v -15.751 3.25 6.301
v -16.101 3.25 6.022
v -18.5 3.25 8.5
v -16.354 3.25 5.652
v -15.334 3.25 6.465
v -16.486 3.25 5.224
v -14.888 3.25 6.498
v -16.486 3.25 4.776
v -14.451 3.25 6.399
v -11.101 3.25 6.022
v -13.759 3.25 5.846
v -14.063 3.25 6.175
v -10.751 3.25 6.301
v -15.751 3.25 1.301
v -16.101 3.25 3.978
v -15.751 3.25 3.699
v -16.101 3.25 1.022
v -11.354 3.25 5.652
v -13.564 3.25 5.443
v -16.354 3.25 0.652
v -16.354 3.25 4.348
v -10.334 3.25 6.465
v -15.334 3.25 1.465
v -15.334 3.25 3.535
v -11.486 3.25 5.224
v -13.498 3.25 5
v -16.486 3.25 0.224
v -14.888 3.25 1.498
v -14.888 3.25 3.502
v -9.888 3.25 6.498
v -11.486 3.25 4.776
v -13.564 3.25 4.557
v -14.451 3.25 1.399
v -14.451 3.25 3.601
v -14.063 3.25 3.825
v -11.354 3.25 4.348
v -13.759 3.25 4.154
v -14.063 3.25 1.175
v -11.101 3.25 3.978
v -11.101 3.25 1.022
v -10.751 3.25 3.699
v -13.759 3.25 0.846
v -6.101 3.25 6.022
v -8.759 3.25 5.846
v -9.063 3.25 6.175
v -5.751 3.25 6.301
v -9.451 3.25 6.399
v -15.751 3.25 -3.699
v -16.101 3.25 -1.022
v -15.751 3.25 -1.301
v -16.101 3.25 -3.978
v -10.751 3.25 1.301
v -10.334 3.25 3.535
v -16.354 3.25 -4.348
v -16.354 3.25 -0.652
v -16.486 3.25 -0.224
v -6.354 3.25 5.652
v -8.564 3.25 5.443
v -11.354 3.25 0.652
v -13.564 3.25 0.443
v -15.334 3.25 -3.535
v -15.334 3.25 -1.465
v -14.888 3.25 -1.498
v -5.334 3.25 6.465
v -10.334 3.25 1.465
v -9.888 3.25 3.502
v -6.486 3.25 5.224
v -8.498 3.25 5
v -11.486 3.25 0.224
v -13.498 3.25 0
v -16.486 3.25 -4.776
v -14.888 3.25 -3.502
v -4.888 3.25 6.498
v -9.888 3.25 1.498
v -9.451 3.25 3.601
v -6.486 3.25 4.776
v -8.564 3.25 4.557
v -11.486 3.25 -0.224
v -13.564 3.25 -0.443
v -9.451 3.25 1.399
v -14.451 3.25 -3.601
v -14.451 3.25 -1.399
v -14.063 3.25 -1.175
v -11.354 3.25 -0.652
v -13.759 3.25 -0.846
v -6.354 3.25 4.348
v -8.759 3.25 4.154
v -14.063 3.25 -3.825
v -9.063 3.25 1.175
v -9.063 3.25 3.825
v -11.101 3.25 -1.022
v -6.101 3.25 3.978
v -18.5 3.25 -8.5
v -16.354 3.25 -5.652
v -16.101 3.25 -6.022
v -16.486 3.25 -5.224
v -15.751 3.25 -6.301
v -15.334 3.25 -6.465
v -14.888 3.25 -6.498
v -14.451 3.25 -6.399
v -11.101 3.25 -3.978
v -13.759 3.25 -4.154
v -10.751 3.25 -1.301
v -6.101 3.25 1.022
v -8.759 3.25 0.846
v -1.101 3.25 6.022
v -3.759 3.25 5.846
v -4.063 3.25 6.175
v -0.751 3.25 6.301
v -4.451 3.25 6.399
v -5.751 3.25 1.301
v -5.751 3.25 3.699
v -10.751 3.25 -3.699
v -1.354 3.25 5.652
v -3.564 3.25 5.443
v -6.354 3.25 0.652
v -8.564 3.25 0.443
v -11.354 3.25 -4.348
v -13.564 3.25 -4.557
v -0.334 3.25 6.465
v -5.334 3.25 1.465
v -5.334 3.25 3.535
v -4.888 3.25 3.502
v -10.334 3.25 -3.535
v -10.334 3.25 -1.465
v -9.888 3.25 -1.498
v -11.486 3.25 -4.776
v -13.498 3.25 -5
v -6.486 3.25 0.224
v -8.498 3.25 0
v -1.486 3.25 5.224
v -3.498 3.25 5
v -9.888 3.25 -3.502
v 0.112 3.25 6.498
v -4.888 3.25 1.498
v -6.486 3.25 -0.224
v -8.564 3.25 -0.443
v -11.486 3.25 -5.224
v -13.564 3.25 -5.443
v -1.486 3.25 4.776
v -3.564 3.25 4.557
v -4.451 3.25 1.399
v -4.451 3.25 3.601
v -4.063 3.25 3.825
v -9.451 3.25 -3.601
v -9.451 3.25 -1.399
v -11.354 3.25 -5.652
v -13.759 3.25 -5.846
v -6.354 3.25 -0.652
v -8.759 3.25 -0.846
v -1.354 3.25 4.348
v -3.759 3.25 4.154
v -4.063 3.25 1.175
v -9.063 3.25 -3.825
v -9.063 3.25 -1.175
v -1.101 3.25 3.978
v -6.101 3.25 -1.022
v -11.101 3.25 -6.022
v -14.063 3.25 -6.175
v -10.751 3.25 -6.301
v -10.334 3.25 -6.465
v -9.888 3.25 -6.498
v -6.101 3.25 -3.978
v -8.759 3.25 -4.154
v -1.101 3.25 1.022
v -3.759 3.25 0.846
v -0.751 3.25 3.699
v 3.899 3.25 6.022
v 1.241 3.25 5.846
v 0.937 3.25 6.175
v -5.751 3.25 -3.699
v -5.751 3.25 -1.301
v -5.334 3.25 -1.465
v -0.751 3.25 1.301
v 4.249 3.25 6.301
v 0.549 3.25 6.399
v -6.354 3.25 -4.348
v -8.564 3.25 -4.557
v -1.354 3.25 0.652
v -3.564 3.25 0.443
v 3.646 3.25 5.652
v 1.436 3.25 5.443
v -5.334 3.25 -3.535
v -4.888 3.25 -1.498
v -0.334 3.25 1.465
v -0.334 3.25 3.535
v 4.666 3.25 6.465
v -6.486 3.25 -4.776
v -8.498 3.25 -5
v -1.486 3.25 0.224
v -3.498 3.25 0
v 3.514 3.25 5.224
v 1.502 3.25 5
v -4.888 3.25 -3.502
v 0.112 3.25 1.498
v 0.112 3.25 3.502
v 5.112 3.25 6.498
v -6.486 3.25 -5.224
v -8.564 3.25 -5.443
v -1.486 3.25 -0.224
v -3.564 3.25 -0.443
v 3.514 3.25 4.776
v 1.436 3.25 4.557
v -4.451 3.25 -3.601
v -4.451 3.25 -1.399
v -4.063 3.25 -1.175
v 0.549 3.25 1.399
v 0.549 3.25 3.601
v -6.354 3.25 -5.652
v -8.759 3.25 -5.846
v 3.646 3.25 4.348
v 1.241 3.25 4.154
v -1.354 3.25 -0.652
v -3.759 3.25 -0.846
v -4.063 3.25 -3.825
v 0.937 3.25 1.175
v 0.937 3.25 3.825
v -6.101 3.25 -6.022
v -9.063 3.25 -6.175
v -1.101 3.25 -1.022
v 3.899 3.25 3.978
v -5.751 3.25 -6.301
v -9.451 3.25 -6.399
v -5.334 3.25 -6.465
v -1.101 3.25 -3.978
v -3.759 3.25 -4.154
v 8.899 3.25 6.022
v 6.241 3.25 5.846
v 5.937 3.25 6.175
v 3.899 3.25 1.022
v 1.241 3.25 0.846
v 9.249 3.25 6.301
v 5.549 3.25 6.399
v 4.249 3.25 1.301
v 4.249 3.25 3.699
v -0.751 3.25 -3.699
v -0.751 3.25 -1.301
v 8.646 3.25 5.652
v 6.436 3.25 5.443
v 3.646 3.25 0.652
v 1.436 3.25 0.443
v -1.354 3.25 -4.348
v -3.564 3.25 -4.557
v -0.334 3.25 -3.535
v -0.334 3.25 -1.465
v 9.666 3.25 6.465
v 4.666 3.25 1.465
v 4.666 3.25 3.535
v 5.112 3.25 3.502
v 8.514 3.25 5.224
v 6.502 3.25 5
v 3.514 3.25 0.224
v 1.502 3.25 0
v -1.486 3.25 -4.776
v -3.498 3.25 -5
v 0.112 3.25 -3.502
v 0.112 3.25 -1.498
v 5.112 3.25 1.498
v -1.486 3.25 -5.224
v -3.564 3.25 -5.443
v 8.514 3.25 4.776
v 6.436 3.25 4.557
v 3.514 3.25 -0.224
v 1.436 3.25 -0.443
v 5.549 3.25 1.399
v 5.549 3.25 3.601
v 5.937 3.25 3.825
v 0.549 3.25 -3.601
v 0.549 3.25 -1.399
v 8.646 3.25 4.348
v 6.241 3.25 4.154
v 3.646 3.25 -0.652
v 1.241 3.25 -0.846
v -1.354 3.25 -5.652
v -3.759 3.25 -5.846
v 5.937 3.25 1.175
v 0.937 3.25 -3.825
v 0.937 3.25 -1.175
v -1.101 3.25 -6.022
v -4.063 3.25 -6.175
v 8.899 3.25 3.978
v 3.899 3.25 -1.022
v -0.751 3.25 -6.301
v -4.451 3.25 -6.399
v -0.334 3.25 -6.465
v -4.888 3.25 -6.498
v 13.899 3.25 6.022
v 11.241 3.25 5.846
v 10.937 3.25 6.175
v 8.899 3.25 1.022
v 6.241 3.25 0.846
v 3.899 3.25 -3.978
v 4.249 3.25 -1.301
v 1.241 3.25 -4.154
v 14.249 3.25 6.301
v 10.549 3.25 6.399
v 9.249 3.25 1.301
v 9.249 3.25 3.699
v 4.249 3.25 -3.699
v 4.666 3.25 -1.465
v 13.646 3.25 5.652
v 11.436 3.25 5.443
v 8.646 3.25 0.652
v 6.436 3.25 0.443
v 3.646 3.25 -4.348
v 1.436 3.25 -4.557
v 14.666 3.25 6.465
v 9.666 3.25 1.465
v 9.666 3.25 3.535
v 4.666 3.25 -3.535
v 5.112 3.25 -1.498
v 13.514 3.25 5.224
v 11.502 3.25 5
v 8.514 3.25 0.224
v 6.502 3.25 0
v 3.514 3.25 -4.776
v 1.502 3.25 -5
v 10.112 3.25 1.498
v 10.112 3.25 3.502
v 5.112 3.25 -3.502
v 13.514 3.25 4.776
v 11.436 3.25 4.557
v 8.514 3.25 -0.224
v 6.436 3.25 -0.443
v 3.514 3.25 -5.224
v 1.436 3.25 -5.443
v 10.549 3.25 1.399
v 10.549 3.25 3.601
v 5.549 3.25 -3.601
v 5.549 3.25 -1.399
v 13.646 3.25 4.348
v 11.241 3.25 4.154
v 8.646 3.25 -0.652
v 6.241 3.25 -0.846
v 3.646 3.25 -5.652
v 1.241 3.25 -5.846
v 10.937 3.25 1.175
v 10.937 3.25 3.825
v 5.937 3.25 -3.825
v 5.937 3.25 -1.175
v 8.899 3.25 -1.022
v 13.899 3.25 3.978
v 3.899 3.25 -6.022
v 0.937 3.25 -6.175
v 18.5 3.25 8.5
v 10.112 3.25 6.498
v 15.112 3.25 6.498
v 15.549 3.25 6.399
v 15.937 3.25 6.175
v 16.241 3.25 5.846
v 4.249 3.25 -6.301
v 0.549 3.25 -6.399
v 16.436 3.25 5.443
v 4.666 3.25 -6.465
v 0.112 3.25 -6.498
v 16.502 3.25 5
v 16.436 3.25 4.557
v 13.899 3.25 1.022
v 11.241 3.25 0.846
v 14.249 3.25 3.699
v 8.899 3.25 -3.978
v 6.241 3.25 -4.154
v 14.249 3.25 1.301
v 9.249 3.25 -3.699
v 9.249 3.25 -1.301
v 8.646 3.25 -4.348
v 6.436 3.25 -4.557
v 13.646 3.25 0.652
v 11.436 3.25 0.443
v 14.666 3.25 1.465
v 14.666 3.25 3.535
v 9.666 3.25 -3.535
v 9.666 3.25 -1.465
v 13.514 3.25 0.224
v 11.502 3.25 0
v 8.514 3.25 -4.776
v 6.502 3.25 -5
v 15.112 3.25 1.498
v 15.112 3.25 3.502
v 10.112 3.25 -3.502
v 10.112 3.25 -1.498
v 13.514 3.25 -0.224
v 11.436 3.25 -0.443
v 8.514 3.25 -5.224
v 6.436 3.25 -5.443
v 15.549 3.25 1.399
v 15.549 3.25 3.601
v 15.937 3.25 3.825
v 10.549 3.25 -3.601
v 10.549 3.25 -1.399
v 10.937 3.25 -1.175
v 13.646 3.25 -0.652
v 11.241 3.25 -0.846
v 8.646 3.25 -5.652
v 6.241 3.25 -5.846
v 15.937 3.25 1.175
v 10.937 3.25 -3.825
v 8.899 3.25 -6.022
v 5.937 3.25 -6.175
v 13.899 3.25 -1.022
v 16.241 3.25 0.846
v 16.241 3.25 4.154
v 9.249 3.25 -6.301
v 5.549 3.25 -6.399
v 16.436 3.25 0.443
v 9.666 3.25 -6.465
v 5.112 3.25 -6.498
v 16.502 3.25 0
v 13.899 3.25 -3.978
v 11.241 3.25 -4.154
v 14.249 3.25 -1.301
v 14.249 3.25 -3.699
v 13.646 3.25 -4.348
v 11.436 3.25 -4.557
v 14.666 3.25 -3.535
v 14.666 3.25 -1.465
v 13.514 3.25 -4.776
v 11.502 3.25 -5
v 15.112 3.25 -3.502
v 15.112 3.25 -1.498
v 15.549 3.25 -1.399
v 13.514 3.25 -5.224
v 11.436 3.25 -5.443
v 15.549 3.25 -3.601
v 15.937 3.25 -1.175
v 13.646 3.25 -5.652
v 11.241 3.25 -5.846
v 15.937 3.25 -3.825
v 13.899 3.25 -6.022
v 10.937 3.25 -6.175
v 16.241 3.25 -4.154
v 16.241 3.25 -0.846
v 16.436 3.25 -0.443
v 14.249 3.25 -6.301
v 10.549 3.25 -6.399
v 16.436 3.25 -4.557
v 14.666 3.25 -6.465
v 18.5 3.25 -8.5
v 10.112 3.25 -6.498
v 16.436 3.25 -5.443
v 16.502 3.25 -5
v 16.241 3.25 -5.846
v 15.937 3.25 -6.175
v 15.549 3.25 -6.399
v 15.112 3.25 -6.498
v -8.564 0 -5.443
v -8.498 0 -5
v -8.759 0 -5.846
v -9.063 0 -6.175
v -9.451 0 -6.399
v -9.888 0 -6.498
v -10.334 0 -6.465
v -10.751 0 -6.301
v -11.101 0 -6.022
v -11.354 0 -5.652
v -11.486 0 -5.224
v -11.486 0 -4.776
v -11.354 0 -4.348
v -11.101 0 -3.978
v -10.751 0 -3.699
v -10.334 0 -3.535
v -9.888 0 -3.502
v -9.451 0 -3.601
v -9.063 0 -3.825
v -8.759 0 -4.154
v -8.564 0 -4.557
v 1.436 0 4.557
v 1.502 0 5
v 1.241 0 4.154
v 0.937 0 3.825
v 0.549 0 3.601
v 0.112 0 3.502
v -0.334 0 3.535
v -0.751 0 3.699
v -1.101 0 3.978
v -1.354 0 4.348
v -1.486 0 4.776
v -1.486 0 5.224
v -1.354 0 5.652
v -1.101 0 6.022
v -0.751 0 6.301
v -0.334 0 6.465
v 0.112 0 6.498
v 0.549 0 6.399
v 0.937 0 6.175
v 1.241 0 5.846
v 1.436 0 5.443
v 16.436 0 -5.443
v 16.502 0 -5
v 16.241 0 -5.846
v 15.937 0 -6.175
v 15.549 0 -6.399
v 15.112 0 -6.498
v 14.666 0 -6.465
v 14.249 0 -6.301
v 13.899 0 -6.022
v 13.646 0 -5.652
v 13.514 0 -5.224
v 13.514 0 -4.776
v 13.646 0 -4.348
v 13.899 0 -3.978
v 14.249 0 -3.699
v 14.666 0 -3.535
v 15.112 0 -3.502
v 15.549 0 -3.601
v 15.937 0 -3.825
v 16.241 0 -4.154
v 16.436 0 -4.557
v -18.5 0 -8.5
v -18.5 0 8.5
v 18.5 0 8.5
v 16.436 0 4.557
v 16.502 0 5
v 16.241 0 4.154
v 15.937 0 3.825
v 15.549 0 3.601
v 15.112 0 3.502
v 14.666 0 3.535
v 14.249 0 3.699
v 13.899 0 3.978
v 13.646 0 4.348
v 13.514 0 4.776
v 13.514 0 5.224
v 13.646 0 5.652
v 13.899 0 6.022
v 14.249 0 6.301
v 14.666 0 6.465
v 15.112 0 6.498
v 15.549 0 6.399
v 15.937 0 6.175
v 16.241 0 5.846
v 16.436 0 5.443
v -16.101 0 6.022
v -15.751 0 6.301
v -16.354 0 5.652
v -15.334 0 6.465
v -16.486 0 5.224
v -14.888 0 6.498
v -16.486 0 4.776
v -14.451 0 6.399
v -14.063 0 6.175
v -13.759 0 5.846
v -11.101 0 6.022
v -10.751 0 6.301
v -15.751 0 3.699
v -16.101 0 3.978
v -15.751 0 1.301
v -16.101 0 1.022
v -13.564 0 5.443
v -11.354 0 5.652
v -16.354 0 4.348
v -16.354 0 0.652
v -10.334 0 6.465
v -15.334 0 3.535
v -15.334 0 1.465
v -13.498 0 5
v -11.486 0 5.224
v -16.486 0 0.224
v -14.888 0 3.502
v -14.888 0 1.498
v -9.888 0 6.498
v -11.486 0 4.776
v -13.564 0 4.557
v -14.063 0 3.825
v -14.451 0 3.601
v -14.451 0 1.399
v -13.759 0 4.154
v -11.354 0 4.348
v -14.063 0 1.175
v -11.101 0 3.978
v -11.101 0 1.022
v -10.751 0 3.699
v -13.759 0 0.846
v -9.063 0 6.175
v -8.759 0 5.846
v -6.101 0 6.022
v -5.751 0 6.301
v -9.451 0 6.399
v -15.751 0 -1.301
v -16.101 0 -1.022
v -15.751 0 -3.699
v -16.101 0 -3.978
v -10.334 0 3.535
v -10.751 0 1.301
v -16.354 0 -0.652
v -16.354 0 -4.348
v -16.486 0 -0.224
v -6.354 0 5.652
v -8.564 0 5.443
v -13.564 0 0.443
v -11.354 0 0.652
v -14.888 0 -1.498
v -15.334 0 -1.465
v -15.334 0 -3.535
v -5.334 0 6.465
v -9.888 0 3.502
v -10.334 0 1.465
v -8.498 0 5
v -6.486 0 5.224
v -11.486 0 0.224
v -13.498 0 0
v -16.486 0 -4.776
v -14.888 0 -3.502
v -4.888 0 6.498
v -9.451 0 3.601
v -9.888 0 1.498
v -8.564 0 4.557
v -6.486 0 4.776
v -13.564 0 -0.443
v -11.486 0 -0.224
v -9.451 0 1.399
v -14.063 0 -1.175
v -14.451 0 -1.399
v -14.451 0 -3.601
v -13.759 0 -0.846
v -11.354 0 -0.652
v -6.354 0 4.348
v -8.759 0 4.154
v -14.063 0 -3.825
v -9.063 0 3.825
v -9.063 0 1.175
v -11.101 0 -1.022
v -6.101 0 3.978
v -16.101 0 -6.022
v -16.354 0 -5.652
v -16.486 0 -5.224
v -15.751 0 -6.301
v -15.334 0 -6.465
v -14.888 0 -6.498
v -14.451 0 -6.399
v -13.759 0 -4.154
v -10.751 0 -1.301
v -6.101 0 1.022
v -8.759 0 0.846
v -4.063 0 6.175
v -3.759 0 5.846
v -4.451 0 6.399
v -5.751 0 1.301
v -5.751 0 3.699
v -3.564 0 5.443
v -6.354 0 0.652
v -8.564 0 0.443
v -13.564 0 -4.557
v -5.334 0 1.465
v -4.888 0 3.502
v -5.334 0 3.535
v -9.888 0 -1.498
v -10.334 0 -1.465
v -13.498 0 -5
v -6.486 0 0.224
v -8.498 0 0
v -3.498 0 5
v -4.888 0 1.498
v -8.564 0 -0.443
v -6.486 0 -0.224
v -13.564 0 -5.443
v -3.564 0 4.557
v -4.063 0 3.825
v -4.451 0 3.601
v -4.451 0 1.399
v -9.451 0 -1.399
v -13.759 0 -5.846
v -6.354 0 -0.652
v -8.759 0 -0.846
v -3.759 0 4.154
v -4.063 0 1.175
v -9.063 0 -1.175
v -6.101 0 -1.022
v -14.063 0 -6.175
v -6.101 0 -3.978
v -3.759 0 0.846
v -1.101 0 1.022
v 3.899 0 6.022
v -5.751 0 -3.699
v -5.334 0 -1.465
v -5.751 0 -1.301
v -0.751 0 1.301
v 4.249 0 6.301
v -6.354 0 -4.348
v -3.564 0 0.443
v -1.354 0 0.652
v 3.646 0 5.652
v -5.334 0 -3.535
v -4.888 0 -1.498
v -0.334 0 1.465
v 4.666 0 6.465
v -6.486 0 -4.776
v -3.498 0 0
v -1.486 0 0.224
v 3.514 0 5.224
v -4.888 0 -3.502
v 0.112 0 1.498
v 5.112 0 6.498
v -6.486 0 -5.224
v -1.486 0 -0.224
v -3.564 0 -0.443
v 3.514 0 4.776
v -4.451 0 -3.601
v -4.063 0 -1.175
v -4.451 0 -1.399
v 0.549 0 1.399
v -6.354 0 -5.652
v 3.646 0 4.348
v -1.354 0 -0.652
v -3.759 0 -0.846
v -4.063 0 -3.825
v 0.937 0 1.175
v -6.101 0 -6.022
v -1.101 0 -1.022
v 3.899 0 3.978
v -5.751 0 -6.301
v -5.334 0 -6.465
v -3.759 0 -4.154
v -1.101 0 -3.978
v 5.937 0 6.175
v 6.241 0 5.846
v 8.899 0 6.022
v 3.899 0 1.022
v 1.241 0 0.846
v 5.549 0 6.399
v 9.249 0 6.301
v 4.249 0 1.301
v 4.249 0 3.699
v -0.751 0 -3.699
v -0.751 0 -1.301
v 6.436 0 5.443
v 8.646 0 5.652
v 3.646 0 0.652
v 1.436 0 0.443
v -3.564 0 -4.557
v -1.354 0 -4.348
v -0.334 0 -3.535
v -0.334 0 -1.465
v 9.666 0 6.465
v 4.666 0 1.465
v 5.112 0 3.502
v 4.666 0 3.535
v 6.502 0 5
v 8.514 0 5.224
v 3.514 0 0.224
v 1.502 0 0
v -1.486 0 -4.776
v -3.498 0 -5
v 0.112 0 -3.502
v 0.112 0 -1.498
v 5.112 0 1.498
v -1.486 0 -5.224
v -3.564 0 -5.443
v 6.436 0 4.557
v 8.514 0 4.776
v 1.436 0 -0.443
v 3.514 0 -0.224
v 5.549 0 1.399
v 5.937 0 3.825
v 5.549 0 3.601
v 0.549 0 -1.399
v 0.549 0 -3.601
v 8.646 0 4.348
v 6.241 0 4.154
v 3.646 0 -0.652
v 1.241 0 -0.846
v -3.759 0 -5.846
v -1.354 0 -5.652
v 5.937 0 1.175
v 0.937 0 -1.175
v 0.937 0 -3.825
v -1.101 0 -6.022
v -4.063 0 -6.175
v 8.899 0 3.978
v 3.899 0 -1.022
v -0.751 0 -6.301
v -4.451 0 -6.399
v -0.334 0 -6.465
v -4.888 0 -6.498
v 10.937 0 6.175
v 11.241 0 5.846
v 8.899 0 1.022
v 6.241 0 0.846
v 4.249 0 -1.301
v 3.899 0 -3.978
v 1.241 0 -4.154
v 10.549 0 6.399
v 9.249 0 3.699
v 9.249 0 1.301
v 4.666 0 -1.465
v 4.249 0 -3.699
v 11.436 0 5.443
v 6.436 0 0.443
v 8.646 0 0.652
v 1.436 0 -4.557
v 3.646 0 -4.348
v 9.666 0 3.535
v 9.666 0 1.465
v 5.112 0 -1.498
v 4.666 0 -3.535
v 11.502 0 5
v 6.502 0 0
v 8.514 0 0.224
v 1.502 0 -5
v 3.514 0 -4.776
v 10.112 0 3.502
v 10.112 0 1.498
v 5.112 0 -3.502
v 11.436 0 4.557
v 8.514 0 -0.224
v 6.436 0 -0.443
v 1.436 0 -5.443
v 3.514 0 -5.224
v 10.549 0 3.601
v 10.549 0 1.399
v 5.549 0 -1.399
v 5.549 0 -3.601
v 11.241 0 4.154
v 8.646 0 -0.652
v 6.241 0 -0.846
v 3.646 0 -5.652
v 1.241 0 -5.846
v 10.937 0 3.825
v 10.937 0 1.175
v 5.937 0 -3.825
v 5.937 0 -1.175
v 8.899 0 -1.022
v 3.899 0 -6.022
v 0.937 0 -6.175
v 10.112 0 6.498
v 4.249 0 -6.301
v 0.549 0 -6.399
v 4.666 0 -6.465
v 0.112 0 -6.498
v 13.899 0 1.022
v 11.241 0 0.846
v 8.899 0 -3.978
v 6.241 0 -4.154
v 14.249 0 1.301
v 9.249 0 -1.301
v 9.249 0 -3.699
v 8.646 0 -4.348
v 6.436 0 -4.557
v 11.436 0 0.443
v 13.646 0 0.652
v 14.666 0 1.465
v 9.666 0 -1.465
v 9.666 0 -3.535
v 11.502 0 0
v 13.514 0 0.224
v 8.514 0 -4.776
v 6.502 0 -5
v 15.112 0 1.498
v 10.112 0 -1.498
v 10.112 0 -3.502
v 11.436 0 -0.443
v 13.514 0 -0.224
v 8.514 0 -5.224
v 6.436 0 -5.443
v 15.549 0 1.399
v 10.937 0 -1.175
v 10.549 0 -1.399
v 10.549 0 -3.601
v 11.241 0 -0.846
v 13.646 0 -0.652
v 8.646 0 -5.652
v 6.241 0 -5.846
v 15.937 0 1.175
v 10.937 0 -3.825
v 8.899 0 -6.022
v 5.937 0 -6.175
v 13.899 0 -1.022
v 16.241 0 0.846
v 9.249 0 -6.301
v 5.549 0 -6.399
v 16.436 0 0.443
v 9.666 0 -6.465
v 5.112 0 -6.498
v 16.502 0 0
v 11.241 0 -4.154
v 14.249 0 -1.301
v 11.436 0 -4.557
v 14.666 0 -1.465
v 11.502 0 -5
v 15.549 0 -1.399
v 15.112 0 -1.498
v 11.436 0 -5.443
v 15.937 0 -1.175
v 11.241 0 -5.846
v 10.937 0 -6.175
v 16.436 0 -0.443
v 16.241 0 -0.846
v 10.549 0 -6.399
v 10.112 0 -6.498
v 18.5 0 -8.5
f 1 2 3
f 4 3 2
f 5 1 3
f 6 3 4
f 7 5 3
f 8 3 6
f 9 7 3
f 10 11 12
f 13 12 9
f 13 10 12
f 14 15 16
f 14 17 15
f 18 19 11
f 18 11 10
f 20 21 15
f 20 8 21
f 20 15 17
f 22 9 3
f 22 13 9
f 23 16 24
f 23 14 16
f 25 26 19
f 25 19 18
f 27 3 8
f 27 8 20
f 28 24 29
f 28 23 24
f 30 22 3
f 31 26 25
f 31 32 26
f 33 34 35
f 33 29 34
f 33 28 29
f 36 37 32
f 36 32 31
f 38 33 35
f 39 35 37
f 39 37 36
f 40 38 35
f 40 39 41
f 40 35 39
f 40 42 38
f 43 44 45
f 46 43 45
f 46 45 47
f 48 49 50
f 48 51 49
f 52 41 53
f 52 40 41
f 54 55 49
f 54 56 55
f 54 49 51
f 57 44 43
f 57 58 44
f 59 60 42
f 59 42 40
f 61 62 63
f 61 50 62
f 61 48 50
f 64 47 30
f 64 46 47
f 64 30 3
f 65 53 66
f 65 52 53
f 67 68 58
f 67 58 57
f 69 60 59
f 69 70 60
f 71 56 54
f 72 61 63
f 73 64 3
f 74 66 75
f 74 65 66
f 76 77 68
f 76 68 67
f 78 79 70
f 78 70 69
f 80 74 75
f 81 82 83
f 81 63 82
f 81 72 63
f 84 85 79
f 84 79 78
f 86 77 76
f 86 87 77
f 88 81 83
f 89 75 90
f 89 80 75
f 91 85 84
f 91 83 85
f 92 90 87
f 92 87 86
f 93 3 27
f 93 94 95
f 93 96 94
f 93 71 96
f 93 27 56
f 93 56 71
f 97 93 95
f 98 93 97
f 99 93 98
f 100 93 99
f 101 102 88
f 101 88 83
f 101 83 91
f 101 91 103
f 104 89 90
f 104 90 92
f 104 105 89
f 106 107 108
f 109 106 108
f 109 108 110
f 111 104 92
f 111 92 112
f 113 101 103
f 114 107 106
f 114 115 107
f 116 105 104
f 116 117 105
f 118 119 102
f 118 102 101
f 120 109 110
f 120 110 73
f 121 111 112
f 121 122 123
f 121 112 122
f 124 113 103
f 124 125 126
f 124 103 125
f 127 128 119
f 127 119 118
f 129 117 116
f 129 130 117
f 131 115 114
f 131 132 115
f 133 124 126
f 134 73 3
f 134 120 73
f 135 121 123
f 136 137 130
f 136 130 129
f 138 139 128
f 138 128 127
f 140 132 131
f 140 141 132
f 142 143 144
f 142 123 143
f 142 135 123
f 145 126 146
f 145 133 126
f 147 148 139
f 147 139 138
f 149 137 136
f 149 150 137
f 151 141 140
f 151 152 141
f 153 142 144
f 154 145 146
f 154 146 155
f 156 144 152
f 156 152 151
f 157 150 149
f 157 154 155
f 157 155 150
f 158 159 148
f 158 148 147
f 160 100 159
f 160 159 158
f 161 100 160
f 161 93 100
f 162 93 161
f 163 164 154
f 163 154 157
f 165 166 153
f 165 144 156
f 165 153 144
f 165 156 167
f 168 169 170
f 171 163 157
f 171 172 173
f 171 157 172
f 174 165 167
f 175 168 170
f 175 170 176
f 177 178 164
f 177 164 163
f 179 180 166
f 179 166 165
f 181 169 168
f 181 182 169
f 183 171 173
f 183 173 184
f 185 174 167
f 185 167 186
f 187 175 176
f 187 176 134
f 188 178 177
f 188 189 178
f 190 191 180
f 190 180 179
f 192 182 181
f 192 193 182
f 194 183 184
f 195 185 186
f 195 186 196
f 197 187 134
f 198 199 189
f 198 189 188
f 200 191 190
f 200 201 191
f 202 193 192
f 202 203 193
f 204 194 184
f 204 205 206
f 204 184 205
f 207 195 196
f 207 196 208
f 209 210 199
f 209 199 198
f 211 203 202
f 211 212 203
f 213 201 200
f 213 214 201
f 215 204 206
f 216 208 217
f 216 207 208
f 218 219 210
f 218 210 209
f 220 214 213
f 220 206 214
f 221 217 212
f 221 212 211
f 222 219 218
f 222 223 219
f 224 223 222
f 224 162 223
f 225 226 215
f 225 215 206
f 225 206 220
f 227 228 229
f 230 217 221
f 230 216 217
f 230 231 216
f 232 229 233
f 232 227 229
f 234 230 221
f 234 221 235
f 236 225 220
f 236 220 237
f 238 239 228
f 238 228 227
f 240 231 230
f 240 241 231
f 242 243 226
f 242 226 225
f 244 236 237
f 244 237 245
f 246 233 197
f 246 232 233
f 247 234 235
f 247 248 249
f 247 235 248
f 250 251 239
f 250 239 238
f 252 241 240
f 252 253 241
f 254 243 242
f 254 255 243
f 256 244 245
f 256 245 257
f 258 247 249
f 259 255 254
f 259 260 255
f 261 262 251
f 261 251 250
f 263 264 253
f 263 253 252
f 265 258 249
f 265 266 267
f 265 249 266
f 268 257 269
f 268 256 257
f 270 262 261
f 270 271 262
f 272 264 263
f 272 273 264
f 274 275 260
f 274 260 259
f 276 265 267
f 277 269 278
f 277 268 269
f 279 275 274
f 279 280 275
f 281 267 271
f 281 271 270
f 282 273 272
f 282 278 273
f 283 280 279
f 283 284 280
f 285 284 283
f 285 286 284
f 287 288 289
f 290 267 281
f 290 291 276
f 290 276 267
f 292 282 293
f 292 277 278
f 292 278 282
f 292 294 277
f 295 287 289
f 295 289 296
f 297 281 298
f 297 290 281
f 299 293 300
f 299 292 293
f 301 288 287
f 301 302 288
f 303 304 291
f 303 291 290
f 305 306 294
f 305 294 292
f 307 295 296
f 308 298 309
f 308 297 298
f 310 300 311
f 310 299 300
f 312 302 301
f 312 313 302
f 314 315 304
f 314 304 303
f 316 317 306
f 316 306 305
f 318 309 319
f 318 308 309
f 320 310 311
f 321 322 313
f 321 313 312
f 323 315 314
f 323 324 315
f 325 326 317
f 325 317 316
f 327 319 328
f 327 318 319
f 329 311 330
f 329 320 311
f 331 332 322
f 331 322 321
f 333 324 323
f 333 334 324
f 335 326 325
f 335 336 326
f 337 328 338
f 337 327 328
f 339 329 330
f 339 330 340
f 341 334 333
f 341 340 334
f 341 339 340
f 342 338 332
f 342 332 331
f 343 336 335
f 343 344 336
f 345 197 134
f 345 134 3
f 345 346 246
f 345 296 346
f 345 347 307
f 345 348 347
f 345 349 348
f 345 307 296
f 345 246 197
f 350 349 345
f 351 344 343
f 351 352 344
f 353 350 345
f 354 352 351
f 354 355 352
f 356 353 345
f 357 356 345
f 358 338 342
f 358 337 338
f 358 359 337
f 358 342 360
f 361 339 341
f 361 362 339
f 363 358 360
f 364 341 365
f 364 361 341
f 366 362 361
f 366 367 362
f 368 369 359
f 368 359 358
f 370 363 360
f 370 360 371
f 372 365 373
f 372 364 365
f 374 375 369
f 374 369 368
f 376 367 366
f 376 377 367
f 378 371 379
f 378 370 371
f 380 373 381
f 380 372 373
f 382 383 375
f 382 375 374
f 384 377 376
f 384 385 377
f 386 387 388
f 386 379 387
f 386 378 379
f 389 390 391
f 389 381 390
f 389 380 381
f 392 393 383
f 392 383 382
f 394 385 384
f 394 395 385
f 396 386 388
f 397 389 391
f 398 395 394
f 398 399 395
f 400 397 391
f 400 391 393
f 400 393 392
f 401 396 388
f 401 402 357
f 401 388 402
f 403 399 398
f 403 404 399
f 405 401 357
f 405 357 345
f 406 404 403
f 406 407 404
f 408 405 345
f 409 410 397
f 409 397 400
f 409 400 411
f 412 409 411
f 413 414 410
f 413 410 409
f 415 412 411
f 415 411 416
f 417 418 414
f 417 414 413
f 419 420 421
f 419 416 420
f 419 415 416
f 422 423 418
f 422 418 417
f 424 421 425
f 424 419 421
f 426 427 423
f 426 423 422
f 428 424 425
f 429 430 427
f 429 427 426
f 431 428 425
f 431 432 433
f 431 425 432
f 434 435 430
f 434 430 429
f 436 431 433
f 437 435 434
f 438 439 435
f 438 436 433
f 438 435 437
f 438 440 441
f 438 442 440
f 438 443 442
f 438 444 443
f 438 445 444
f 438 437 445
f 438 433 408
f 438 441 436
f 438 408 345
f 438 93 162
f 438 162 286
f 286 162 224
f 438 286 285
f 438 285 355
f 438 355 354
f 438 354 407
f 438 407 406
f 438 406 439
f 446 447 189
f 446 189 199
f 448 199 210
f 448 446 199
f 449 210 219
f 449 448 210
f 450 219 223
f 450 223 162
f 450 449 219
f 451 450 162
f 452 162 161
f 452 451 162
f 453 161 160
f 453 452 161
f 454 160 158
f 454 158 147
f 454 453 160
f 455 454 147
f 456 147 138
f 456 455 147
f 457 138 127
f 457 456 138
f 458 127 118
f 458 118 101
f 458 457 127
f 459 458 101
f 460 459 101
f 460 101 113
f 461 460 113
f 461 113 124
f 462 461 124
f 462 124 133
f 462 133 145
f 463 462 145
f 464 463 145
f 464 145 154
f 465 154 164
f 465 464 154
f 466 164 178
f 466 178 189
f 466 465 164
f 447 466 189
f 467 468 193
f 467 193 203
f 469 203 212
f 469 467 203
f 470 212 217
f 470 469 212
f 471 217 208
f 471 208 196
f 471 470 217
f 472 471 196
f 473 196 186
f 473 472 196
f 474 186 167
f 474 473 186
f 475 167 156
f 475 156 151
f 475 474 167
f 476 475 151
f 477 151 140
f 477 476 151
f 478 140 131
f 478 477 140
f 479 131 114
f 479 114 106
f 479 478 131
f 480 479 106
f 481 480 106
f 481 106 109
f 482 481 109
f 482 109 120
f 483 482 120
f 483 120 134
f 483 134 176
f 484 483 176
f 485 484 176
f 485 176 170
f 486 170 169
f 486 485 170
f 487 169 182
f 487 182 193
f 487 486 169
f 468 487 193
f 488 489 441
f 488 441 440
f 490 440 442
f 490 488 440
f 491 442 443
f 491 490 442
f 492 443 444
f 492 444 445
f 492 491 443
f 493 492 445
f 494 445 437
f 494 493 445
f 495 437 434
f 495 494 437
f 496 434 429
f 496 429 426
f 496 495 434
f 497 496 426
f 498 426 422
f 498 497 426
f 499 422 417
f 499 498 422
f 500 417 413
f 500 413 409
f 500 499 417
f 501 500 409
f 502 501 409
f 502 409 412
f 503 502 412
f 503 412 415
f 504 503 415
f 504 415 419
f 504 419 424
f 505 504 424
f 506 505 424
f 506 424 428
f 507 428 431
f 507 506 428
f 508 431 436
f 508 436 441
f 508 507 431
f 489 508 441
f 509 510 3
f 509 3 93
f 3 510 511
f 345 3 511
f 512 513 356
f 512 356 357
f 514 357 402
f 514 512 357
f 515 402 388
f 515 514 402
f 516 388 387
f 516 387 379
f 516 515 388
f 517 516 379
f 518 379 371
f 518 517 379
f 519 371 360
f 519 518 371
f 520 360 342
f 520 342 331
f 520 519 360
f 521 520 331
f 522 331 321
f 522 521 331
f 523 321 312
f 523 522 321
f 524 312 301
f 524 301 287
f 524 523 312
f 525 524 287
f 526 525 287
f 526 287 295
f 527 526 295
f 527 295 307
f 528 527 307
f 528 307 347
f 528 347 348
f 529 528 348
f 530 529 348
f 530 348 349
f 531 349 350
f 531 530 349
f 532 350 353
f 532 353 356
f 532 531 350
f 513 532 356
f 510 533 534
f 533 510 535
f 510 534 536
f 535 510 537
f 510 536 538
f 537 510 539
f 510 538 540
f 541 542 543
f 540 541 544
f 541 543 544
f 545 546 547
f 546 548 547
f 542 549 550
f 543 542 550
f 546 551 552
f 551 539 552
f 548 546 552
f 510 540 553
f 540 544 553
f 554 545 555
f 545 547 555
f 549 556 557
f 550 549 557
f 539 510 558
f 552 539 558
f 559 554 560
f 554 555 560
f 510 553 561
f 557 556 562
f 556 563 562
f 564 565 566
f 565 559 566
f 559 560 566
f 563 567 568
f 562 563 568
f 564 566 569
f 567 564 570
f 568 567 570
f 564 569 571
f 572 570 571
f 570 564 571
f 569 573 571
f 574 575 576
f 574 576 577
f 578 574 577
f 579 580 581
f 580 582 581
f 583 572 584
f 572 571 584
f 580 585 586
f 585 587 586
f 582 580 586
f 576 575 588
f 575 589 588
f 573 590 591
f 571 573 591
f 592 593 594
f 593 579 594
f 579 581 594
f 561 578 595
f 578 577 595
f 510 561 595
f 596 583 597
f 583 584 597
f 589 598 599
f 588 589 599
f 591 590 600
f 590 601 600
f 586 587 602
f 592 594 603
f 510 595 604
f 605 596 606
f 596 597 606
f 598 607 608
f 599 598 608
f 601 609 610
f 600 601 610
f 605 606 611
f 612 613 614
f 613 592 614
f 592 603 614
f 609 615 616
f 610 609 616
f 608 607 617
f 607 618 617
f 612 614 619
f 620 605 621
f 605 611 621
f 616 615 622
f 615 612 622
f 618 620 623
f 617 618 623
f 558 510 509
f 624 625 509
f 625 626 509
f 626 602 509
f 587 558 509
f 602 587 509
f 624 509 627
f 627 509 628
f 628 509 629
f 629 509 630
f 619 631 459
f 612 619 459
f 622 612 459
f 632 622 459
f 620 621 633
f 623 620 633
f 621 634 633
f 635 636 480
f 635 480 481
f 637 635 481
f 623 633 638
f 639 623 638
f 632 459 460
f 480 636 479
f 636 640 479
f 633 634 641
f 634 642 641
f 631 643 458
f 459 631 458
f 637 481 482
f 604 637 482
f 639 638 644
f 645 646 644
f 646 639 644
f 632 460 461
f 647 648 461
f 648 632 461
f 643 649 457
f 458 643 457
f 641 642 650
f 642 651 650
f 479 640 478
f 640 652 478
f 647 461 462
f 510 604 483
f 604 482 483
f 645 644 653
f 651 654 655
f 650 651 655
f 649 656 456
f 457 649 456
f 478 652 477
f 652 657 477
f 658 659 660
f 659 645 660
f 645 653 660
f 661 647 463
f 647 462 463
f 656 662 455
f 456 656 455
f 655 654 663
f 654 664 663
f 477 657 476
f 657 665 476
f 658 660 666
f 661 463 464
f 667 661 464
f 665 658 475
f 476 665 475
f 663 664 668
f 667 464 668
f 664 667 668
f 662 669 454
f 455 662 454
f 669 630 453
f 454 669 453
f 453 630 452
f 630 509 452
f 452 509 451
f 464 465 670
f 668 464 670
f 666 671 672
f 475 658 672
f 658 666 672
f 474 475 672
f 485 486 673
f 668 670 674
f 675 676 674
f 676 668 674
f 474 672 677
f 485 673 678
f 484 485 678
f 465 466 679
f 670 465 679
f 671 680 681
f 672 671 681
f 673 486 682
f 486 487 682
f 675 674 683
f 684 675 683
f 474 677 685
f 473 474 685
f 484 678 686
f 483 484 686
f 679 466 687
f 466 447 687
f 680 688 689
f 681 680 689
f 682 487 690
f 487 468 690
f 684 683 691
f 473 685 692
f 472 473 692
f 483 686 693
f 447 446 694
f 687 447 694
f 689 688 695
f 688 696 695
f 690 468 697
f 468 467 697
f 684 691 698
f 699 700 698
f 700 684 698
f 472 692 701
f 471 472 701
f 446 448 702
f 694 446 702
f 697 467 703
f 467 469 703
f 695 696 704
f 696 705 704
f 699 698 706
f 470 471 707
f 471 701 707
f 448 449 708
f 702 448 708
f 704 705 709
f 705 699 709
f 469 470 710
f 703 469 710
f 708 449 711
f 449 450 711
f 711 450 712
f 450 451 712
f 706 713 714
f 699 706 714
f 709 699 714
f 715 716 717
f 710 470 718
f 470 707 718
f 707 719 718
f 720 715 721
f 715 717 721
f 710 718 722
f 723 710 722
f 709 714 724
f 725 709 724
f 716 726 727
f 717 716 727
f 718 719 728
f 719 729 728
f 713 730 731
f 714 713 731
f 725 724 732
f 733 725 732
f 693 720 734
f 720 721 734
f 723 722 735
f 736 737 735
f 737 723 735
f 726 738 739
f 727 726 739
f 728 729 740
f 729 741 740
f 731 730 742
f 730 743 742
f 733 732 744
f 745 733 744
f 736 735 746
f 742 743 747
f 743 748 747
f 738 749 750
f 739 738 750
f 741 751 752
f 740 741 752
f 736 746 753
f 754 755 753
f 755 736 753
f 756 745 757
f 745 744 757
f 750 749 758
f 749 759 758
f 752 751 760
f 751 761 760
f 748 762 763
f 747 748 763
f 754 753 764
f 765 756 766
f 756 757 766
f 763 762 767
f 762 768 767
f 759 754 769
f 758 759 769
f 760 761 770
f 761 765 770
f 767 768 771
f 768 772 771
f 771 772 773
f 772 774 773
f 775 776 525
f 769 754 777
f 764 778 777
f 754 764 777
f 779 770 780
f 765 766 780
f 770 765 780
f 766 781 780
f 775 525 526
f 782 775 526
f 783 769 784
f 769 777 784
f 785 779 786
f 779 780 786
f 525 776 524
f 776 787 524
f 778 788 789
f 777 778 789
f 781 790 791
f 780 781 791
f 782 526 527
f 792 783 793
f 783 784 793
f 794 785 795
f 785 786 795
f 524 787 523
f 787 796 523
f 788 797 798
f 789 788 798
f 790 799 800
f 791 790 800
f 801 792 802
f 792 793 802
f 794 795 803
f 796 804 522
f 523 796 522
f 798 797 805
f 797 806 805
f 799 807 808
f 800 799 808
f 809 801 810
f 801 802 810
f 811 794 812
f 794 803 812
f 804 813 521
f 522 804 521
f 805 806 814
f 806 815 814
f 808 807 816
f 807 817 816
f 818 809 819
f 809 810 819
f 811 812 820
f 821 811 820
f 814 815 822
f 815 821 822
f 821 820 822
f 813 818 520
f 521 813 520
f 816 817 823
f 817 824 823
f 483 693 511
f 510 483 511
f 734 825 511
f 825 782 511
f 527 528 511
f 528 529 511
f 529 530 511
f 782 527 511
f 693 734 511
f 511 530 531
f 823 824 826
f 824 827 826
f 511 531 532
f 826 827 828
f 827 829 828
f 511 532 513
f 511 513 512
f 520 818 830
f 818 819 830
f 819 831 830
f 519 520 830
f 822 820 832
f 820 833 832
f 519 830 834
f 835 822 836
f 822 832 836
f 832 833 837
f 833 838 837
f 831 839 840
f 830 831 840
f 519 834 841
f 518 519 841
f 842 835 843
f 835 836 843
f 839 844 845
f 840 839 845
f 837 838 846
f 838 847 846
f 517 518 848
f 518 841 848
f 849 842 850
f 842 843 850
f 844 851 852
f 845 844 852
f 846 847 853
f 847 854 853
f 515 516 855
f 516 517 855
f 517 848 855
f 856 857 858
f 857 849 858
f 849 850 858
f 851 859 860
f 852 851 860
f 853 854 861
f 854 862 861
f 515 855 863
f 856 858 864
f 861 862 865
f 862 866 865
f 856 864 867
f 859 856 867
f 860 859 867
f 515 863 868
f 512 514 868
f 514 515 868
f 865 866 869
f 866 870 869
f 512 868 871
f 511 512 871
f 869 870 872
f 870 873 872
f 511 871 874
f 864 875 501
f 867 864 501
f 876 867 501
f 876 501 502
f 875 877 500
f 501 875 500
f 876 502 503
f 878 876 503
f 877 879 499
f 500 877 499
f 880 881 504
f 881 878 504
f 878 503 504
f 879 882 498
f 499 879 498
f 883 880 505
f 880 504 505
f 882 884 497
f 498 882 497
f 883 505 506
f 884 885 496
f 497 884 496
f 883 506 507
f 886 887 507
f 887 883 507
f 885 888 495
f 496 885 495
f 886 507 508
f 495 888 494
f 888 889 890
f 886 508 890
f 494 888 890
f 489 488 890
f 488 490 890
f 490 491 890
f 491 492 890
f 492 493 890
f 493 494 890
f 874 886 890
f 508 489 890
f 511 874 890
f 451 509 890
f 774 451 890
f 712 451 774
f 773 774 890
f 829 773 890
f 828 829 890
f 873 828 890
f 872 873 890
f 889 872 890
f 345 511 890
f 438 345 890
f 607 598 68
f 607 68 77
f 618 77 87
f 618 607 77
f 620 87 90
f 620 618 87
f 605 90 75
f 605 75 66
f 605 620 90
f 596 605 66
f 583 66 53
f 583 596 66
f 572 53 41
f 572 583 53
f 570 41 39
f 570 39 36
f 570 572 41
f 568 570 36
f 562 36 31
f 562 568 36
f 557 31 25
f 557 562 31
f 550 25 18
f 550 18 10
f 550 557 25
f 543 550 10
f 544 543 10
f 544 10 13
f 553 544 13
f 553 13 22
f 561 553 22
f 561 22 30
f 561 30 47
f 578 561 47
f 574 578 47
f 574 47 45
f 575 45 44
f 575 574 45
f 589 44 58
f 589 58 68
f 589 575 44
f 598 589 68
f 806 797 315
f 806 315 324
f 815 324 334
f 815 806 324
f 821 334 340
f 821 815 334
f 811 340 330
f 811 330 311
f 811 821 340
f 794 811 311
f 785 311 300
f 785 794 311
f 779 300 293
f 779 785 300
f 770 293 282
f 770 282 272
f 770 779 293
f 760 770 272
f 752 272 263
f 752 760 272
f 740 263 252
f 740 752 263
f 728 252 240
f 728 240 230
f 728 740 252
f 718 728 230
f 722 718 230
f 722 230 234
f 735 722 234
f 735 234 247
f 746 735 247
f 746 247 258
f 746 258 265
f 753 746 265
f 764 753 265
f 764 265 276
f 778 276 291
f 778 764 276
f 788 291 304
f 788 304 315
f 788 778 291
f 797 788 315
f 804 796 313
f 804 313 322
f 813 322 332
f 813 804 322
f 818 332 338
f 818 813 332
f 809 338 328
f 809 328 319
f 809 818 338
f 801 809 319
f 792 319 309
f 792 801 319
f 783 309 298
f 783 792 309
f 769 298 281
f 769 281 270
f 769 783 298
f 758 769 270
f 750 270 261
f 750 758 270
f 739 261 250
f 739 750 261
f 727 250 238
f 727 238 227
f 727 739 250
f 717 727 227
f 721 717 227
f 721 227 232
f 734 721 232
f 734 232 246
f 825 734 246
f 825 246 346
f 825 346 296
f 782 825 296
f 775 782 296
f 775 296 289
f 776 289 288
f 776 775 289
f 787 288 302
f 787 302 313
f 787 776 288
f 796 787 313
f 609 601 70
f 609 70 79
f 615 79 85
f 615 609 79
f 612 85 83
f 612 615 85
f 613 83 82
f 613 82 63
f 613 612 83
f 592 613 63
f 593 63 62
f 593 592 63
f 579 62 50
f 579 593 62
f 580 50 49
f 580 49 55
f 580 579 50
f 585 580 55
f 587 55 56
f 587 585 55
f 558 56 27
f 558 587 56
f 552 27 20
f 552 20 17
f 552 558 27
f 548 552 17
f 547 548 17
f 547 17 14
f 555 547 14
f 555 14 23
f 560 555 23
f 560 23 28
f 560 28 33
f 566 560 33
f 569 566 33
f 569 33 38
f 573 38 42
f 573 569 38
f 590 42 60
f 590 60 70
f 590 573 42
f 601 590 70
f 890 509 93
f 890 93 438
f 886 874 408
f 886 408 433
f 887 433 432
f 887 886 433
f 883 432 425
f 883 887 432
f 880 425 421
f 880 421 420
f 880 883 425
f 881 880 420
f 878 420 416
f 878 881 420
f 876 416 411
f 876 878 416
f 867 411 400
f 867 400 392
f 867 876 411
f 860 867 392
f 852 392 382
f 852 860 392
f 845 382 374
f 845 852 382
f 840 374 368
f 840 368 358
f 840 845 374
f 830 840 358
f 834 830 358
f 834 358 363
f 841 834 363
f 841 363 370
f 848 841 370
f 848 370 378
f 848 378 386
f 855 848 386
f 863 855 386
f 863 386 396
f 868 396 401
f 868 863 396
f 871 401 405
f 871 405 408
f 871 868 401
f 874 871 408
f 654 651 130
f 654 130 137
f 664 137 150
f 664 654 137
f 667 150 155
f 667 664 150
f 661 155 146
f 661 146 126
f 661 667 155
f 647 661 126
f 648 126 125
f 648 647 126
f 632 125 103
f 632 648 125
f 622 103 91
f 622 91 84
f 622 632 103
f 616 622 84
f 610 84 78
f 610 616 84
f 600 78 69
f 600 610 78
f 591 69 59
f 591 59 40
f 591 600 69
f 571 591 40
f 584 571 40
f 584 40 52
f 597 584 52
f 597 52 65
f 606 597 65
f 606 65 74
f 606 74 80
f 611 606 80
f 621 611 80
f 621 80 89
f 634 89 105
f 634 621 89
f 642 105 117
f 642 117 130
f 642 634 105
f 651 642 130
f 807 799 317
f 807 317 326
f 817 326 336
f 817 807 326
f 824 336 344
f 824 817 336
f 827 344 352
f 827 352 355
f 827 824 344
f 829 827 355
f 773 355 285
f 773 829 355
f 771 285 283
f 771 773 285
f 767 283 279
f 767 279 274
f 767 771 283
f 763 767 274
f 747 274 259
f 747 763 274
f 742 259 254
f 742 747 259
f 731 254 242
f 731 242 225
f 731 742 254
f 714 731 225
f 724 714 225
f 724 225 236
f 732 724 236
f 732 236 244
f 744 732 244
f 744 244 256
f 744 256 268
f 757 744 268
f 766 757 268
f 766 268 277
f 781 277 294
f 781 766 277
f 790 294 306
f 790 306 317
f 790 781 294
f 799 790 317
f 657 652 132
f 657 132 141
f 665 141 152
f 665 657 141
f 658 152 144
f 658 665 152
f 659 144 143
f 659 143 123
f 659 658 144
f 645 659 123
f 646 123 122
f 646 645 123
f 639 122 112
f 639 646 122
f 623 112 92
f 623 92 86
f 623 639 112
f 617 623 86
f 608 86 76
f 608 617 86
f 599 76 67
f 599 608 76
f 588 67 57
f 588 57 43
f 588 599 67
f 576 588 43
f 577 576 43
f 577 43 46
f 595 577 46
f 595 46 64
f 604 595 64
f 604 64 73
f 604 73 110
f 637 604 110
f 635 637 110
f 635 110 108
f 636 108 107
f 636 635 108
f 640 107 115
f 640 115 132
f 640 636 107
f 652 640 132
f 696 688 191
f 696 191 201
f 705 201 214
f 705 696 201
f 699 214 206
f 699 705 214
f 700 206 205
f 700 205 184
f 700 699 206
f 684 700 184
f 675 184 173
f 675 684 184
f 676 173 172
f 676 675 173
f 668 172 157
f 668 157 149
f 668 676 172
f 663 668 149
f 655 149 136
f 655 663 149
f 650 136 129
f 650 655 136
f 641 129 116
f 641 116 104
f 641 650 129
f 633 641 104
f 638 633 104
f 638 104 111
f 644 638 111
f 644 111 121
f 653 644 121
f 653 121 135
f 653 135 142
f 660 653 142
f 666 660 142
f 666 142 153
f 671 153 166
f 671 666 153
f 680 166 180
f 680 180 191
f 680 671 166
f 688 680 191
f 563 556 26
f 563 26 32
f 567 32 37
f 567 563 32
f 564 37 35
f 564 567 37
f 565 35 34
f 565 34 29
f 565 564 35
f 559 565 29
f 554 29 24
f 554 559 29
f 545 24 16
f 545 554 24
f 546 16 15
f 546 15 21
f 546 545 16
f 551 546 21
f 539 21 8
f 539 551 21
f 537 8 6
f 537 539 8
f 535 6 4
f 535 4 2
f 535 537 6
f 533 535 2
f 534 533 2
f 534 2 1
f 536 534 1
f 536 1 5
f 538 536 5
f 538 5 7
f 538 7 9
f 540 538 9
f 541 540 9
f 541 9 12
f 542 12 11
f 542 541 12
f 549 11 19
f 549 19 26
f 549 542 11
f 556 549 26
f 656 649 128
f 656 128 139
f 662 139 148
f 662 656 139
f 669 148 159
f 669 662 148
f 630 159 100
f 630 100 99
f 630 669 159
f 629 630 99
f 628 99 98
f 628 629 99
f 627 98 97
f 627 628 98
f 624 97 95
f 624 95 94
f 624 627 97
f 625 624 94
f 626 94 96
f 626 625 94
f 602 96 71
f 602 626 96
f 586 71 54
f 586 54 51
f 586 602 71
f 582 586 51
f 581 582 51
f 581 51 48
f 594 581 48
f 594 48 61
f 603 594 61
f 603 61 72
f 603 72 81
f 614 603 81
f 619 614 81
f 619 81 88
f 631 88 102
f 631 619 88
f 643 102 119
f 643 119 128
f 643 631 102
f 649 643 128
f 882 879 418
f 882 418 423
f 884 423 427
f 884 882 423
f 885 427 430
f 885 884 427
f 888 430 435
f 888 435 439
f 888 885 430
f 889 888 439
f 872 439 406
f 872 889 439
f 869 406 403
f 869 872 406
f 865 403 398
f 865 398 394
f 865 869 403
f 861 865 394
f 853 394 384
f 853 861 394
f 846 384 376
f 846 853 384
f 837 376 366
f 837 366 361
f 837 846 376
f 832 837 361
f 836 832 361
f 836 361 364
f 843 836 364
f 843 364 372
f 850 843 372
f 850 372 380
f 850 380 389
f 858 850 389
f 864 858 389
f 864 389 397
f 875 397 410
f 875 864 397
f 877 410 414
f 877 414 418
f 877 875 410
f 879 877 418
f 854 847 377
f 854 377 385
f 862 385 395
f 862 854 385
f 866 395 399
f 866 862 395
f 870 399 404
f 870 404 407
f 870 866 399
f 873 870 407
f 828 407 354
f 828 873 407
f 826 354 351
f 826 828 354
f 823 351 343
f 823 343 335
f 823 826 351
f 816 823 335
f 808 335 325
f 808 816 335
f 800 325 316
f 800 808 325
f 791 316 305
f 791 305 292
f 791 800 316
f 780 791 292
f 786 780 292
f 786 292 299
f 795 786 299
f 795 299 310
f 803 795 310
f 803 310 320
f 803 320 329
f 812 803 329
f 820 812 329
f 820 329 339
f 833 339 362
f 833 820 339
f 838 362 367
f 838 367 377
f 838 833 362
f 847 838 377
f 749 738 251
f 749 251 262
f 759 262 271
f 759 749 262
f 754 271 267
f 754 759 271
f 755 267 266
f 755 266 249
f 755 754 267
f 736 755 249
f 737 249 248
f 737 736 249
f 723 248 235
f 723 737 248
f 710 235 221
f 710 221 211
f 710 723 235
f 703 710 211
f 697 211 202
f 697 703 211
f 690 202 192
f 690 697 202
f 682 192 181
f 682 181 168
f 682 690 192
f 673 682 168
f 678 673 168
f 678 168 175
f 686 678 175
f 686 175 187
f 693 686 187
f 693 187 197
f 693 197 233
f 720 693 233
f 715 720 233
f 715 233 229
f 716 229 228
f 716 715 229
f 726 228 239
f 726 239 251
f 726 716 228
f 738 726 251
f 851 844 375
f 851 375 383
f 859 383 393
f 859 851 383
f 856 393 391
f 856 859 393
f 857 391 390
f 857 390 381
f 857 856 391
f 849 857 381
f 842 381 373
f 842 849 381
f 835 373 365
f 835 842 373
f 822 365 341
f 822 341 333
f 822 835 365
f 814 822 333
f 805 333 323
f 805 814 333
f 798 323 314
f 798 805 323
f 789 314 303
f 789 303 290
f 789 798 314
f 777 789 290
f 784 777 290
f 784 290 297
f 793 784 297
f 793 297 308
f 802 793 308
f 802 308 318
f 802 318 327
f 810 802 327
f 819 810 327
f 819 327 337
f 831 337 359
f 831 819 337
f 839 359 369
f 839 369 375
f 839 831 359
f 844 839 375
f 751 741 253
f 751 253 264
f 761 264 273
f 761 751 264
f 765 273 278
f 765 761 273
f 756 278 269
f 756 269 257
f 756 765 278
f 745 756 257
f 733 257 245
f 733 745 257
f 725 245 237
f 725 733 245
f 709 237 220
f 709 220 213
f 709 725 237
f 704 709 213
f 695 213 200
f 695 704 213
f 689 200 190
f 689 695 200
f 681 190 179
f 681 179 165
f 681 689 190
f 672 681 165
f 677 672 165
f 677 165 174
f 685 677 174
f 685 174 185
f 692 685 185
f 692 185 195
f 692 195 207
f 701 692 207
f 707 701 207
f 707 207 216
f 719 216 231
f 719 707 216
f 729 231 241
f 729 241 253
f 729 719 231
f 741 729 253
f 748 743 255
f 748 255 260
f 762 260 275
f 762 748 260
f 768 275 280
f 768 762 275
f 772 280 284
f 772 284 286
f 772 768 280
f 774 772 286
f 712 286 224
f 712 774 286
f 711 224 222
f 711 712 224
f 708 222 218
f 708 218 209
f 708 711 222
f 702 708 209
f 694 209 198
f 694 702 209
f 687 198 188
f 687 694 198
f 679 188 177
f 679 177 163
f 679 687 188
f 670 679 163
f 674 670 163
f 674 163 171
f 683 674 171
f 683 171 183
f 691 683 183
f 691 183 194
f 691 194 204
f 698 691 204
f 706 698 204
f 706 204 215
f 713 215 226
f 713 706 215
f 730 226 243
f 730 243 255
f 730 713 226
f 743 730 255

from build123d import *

# Parameters (mm, degrees)
SKETCH1_W           = 37
SKETCH1_H           = 17
SKETCH1_R           = 1.5025
BOSS_EXTRUDE1_DEPTH = 3.25


with BuildPart() as part:
    # Sketch1 → Boss-Extrude1 (new body)
    with BuildSketch(Plane(origin=(0, 0, 0), x_dir=(1, 0, 0), z_dir=(0, 1, 0))):
        Rectangle(SKETCH1_W, SKETCH1_H)
        with Locations((-15, -5)):
            Circle(SKETCH1_R, mode=Mode.SUBTRACT)
        with Locations((-10, -5)):
            Circle(SKETCH1_R, mode=Mode.SUBTRACT)
        with Locations((-5, -5)):
            Circle(SKETCH1_R, mode=Mode.SUBTRACT)
        with Locations((0, -5)):
            Circle(SKETCH1_R, mode=Mode.SUBTRACT)
        with Locations((5, -5)):
            Circle(SKETCH1_R, mode=Mode.SUBTRACT)
        with Locations((10, -5)):
            Circle(SKETCH1_R, mode=Mode.SUBTRACT)
        with Locations((15, -5)):
            Circle(SKETCH1_R, mode=Mode.SUBTRACT)
        with Locations((-10, 0)):
            Circle(SKETCH1_R, mode=Mode.SUBTRACT)
        with Locations((-5, 0)):
            Circle(SKETCH1_R, mode=Mode.SUBTRACT)
        Circle(SKETCH1_R, mode=Mode.SUBTRACT)
        with Locations((5, 0)):
            Circle(SKETCH1_R, mode=Mode.SUBTRACT)
        with Locations((10, 0)):
            Circle(SKETCH1_R, mode=Mode.SUBTRACT)
        with Locations((15, 0)):
            Circle(SKETCH1_R, mode=Mode.SUBTRACT)
        with Locations((-10, 5)):
            Circle(SKETCH1_R, mode=Mode.SUBTRACT)
        with Locations((-5, 5)):
            Circle(SKETCH1_R, mode=Mode.SUBTRACT)
        with Locations((0, 5)):
            Circle(SKETCH1_R, mode=Mode.SUBTRACT)
        with Locations((5, 5)):
            Circle(SKETCH1_R, mode=Mode.SUBTRACT)
        with Locations((10, 5)):
            Circle(SKETCH1_R, mode=Mode.SUBTRACT)
        with Locations((15, 5)):
            Circle(SKETCH1_R, mode=Mode.SUBTRACT)
        with Locations((-15, 0)):
            Circle(SKETCH1_R, mode=Mode.SUBTRACT)
        with Locations((-15, 5)):
            Circle(SKETCH1_R, mode=Mode.SUBTRACT)
    extrude(amount=BOSS_EXTRUDE1_DEPTH)


solid = part.part
